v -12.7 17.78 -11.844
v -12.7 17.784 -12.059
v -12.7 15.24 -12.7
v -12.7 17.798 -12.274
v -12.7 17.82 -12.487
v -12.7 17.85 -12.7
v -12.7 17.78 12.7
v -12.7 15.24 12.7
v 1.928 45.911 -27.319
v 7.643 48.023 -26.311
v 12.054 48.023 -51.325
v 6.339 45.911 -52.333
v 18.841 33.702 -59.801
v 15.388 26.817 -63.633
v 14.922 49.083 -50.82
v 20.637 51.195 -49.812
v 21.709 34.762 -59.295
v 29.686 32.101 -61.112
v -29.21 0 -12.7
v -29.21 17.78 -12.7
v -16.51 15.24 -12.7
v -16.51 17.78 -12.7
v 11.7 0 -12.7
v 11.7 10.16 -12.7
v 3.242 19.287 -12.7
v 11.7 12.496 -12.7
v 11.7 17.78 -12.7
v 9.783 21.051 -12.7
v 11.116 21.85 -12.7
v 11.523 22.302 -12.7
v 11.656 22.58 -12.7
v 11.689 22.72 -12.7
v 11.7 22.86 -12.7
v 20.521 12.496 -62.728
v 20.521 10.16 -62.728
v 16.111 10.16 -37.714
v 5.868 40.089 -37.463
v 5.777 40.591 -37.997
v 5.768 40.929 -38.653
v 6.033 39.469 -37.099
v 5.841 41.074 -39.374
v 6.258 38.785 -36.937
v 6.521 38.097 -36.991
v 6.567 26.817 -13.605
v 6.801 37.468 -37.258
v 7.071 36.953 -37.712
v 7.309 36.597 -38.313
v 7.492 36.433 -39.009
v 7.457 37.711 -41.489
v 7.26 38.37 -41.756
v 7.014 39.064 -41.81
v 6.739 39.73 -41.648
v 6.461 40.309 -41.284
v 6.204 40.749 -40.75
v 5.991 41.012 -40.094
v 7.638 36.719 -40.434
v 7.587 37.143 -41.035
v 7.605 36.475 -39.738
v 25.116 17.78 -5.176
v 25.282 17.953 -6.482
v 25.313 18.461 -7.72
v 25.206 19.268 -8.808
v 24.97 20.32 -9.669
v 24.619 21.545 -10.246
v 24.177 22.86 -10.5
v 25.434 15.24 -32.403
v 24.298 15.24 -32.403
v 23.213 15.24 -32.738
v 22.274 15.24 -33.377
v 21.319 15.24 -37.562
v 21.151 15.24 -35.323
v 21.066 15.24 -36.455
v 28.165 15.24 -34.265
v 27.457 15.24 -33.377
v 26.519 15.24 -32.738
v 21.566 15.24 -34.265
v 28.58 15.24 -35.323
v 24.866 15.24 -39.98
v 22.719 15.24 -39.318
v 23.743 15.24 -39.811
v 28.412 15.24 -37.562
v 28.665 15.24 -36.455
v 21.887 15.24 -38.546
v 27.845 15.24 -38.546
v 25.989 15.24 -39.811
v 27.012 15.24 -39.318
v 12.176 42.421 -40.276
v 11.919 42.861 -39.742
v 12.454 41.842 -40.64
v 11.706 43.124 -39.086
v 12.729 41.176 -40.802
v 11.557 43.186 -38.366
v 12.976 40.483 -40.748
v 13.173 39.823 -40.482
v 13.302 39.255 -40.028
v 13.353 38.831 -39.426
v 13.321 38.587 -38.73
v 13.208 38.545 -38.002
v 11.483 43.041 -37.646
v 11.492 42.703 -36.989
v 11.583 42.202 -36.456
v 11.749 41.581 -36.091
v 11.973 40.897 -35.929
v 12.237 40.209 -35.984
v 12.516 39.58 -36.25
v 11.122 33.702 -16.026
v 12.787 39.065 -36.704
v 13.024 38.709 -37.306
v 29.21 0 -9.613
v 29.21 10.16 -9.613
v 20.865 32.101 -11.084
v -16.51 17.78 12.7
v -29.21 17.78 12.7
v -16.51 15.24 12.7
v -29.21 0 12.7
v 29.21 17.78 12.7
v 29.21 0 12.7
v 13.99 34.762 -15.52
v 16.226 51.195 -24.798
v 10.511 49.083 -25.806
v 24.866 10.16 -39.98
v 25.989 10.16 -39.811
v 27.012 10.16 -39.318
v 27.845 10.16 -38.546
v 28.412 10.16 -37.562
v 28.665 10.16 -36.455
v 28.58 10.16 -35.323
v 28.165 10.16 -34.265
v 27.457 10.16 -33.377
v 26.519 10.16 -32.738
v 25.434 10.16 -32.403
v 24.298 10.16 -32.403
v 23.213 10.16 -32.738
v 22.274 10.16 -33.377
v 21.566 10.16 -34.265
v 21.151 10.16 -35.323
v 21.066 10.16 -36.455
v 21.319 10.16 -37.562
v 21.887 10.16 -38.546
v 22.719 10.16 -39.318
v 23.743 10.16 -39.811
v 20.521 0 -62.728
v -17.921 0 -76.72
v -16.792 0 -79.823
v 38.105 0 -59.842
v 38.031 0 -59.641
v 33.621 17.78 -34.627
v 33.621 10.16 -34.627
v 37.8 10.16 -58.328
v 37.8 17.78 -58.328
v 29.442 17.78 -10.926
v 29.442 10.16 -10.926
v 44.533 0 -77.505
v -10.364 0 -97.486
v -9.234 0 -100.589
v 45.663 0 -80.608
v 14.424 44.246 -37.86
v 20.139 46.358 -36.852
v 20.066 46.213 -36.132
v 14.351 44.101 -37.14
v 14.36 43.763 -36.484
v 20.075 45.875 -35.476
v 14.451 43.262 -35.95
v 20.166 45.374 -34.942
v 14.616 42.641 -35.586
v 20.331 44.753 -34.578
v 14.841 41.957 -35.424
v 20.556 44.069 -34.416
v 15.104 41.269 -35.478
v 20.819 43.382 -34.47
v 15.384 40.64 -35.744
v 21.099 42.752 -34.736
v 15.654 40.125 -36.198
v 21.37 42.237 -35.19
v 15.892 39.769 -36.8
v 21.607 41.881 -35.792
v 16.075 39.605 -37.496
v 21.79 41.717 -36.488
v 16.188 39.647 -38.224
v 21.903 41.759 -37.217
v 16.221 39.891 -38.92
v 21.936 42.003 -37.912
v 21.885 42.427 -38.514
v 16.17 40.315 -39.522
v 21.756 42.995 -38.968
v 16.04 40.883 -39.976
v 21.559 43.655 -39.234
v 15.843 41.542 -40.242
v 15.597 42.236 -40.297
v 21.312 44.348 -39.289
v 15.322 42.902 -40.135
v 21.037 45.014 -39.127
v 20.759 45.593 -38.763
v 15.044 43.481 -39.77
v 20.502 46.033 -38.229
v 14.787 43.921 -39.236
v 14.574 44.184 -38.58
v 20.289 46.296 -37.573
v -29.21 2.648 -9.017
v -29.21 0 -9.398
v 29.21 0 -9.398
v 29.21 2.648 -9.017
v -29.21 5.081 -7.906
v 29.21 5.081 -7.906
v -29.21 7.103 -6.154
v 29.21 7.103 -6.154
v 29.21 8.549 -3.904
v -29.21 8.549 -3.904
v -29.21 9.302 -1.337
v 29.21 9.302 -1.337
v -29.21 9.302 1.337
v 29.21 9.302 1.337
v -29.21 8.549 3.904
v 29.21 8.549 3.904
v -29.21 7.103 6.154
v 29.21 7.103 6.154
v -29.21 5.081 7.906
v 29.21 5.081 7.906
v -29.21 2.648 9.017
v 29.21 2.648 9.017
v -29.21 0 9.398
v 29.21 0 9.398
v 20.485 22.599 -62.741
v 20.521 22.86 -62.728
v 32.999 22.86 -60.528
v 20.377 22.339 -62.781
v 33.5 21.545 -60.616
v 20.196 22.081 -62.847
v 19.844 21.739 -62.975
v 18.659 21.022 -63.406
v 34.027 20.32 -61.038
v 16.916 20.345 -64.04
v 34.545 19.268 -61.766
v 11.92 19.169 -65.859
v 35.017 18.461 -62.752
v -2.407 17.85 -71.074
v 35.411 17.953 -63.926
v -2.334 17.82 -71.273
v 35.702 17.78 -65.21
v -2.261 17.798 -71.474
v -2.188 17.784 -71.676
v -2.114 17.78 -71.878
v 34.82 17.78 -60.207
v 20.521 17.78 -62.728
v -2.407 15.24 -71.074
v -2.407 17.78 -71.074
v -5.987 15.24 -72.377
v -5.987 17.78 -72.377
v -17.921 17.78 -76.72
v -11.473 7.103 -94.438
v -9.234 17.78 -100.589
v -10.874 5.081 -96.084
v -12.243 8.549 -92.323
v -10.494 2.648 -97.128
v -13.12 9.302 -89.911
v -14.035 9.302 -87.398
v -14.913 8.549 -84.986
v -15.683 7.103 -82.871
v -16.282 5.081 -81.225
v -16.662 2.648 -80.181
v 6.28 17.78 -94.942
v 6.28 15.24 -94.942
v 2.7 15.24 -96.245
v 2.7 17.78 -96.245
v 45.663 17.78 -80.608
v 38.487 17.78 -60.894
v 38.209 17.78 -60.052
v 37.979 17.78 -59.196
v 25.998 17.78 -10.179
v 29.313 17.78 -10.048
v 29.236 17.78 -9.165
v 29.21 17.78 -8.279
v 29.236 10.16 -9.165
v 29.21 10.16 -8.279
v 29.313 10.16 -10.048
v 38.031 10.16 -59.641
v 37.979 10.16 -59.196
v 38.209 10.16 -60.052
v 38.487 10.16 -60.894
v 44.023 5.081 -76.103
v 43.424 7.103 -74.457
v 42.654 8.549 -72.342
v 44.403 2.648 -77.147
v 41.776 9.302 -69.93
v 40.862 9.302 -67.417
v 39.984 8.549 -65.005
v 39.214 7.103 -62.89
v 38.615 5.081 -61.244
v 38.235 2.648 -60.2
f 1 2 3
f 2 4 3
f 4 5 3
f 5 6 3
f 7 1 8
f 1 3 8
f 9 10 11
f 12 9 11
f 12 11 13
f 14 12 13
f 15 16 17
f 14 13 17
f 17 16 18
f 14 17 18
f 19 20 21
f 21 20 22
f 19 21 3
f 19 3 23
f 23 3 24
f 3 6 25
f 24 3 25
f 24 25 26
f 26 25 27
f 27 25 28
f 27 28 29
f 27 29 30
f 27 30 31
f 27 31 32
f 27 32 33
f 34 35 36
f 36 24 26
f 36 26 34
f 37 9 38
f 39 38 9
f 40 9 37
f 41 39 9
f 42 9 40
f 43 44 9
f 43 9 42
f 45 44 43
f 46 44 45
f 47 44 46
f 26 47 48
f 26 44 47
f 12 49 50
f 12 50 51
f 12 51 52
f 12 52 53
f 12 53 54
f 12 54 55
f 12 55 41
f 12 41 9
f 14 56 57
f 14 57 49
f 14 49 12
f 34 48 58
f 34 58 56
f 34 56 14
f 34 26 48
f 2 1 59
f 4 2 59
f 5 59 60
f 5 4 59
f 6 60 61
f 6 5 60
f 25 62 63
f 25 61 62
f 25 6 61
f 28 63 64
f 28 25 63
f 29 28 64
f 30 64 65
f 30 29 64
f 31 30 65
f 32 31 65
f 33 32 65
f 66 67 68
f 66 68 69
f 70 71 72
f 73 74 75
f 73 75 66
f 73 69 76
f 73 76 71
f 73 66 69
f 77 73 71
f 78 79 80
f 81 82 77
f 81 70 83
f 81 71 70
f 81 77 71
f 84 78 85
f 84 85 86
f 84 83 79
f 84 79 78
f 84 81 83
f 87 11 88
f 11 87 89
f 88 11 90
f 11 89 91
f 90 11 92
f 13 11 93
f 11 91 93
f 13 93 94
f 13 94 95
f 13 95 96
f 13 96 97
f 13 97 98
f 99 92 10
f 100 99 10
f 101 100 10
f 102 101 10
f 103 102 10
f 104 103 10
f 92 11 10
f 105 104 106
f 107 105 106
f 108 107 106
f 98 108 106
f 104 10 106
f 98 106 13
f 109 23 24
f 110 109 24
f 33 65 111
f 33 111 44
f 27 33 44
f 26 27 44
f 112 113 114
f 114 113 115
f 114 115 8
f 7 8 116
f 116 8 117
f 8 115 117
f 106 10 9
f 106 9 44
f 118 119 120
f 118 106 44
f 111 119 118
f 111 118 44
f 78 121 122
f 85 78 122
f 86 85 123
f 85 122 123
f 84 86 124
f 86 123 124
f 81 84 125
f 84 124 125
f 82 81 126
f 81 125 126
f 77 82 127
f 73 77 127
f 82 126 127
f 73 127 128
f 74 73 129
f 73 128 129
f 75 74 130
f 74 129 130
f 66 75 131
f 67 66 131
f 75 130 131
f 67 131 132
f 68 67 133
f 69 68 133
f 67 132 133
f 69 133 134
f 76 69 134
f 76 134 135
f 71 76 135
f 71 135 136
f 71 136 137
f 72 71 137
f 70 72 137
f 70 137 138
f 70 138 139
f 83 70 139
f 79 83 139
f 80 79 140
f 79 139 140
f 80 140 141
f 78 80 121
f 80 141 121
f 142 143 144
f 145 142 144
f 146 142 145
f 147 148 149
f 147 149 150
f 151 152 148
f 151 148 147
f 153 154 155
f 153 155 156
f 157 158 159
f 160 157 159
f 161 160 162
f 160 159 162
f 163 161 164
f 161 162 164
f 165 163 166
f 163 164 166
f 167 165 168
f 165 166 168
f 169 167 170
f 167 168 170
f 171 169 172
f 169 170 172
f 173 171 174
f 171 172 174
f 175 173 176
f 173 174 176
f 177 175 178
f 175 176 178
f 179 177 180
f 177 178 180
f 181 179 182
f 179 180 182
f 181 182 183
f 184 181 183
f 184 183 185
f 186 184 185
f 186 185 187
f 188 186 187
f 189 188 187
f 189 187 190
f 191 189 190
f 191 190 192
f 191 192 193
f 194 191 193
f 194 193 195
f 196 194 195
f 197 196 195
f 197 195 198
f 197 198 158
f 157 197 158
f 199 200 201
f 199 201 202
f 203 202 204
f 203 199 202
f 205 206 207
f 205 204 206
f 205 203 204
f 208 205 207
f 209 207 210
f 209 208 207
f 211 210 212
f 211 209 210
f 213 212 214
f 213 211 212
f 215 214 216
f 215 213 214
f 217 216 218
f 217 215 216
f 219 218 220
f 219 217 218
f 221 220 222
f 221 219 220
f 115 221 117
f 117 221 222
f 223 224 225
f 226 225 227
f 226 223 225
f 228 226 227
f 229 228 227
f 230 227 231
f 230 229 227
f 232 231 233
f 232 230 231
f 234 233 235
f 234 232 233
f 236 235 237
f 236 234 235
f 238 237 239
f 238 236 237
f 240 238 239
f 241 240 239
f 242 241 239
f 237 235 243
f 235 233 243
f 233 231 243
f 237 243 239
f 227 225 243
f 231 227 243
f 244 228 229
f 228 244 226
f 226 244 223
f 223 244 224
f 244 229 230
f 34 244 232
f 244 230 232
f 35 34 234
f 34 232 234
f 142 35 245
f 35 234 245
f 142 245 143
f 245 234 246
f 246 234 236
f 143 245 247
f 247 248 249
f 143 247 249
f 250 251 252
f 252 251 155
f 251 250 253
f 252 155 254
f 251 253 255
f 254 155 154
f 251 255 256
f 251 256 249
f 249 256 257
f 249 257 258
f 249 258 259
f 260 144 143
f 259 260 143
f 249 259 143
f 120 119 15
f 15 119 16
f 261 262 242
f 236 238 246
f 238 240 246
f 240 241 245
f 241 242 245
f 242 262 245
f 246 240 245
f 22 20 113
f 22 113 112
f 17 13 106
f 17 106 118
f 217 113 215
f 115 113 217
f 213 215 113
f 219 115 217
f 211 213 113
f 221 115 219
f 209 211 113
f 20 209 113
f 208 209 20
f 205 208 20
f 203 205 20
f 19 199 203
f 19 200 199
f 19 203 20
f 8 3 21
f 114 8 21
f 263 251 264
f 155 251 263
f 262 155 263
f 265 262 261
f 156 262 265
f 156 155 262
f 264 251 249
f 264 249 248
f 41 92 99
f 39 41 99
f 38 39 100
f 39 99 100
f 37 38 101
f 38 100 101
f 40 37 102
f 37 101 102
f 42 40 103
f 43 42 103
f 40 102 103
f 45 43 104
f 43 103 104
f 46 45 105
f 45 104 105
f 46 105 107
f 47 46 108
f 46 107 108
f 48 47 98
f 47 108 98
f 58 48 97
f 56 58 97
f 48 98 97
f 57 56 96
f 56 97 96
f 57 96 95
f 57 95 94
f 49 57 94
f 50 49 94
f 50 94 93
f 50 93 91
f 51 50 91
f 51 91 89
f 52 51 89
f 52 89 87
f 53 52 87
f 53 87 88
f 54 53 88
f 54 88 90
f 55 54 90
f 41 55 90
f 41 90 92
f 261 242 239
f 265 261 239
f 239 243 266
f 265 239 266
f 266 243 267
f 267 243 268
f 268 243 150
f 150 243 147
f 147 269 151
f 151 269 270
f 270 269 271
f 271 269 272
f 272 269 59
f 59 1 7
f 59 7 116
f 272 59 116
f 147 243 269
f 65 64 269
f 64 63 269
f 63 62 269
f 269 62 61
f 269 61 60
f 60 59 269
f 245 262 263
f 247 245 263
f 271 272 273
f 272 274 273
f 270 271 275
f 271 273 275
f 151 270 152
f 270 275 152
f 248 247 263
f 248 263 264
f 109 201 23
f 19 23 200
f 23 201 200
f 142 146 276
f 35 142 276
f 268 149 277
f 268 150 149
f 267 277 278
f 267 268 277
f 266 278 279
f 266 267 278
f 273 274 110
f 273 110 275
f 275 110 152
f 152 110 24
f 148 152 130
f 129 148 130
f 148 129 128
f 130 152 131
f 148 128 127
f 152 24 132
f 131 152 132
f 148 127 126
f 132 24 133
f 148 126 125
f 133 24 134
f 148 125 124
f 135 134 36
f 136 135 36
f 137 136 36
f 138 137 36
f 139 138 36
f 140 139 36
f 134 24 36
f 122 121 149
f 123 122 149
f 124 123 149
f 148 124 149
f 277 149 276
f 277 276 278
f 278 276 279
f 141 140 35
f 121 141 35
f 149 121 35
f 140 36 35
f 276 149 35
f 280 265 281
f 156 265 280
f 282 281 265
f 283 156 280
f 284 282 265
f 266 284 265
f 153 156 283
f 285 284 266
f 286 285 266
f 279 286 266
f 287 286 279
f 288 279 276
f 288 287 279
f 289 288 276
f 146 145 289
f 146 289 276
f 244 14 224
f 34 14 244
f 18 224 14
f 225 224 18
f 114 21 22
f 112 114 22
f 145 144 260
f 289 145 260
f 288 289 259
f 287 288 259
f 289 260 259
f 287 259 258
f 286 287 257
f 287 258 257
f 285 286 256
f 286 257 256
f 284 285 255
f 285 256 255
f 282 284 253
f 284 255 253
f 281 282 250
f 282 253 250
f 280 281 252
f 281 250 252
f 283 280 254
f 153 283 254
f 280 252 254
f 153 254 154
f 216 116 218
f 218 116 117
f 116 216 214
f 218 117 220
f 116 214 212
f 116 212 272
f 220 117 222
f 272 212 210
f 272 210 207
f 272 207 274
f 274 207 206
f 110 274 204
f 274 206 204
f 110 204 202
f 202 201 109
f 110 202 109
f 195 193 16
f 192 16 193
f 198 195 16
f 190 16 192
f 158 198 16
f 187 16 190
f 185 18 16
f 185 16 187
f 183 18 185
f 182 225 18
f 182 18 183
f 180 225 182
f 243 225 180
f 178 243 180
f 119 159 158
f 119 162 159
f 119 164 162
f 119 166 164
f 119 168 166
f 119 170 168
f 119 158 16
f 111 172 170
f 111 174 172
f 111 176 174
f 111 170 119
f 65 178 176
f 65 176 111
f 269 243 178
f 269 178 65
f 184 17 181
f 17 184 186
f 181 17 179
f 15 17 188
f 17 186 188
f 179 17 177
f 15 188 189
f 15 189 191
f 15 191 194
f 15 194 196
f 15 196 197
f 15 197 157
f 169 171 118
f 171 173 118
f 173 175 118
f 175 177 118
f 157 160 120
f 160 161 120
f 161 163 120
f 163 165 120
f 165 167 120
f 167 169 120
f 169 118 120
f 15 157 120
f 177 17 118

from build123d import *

# Parameters (mm, degrees)
SKETCH2_W           = 58.42
SKETCH2_H           = 25.4
BOSS_EXTRUDE1_DEPTH = 17.78
CUT_EXTRUDE2_DEPTH  = 63.372388122
SKETCH6_W           = 3.81
SKETCH6_H           = 2.54
CUT_EXTRUDE3_DEPTH  = 25.4
CUT_EXTRUDE4_DEPTH  = 25.4
SKETCH8_W           = 17.78
SKETCH8_H           = 17.78
BOSS_EXTRUDE2_DEPTH = 25.4
SKETCH13_W          = 58.42
SKETCH13_H          = 9.398
CUT_EXTRUDE6_REACH  = 59.763
SKETCH15_W          = 25.4
SKETCH15_H          = 10.16
MIRROR14_START      = 9.31703521
MIRROR14_OUTLINE_W  = 7.62
MIRROR14_OUTLINE_H  = 25.4
MIRROR14_DEPTH      = 17.78
CUT_EXTRUDE7_DEPTH  = 25.4
BOSS_EXTRUDE3_DEPTH = 35.56
CUT_EXTRUDE8_REACH  = 128.018
CUT_EXTRUDE9_REACH  = 111.199
CUT_EXTRUDE10_REACH = 128.018
SKETCH25_R          = 2.4765
SKETCH26_R          = 3.81
CUT_EXTRUDE11_DEPTH = 5.08
FILLET1_R           = 15.24
FILLET2_R           = 5.08


with BuildPart() as part:
    # Sketch2 → Boss-Extrude1 (new body)
    with BuildSketch(Plane(origin=(0, 0, 0), x_dir=(1, 0, 0), z_dir=(0, 1, 0))):
        Rectangle(SKETCH2_W, SKETCH2_H)
    boss_extrude1 = extrude(amount=BOSS_EXTRUDE1_DEPTH)

    # Sketch4 → Cut-Extrude2 (cut, symmetric)
    with BuildSketch(Plane.ZY.offset(29.21)):
        with BuildLine():
            Line((-9.398, -66.725655712), (-9.398, 0))
            ThreePointArc((-9.398, 0), (0, 9.398), (9.398, 0))
            Line((9.398, 0), (9.398, -66.725655712))
            Line((9.398, -66.725655712), (9.398, -200.176967137))
            Line((9.398, -200.176967137), (-9.398, -200.176967137))
            Line((-9.398, -200.176967137), (-9.398, -66.725655712))
        make_face()
    cut_extrude2 = extrude(amount=CUT_EXTRUDE2_DEPTH, both=True, mode=Mode.SUBTRACT)

    # Sketch6 → Cut-Extrude3 (cut)
    with BuildSketch(Plane(origin=(0, 0, -12.7), x_dir=(-1, 0, 0), z_dir=(0, 0, -1))):
        with Locations((14.605, 16.51)):
            Rectangle(SKETCH6_W, SKETCH6_H)
    cut_extrude3 = extrude(amount=-CUT_EXTRUDE3_DEPTH, mode=Mode.SUBTRACT)

    # Sketch7 → Cut-Extrude4 (cut)
    with BuildSketch(Plane(origin=(0, 17.78, 0), x_dir=(1, 0, 0), z_dir=(0, 1, 0))):
        Polygon((11.700118151, 12.7), (29.21, 9.612535401), (29.21, 12.7), align=None)
    extrude(amount=-CUT_EXTRUDE4_DEPTH, mode=Mode.SUBTRACT)

    # Sketch8 → Boss-Extrude2 (add)
    with BuildSketch(Plane(origin=(2.524629641, 0, -14.317886186), x_dir=(-0.9848077530122094, 0, -0.17364817766692317), z_dir=(0.17364817766692317, 0, -0.9848077530122094))):
        with Locations((-18.20703521, 8.89)):
            Rectangle(SKETCH8_W, SKETCH8_H)
    extrude(amount=BOSS_EXTRUDE2_DEPTH)

    # Sketch13 → Cut-Revolve2 (revolve, cut)
    with BuildSketch(Plane.XZ):
        with Locations((0, 4.699)):
            Rectangle(SKETCH13_W, SKETCH13_H)
    revolve(axis=Axis((28.421300087, 0, 0), (-1, 0, 0)), mode=Mode.SUBTRACT)

    # Sketch15 → Cut-Extrude6 (cut, up to next)
    with BuildSketch(Plane(origin=(9.17548851, 0, 1.617886186), x_dir=(-0.17364817766692317, 0, 0.9848077530122095), z_dir=(-0.9848077530122095, 0, -0.17364817766692317)), mode=Mode.PRIVATE) as cut_extrude6_sk1:
        with Locations((-27.238762659, 5.08)):
            Rectangle(SKETCH15_W, SKETCH15_H)
    cut_extrude6_tool1 = extrude(cut_extrude6_sk1.sketch, amount=-CUT_EXTRUDE6_REACH, mode=Mode.PRIVATE) & part.part
    cut_extrude6 = cut_extrude6_tool1.solids().sort_by_distance((13.90545, 5.08, -25.207058))[0]
    add(cut_extrude6, mode=Mode.SUBTRACT)

    # Mirror14: read off the stored shape, not the designer's step
    # Mirror14 outline → Mirror14 (add)
    with BuildSketch(Plane(origin=(0, 0, 0), x_dir=(0, 1, 0), z_dir=(0.9848077530122094, 0, 0.17364817766692306)).offset(MIRROR14_START)):
        with Locations((13.97, -52.638762659)):
            Rectangle(MIRROR14_OUTLINE_W, MIRROR14_OUTLINE_H)
    extrude(amount=MIRROR14_DEPTH)

    # Mirror15: Boss-Extrude1 across plane
    add(boss_extrude1.mirror(Plane(origin=(6.935293354, 0, -39.332003112), x_dir=(0.9848077530122092, 0, 0.17364817766692314), z_dir=(0.17364817766692314, 0, -0.9848077530122094))))

    # Mirror16: Cut-Extrude2, Cut-Extrude3, Cut-Extrude6 across plane
    add(cut_extrude2.mirror(Plane(origin=(6.935293354, 0, -39.332003112), x_dir=(0.9848077530122092, 0, 0.17364817766692314), z_dir=(0.17364817766692314, 0, -0.9848077530122094))), mode=Mode.SUBTRACT)
    add(cut_extrude3.mirror(Plane(origin=(6.935293354, 0, -39.332003112), x_dir=(0.9848077530122092, 0, 0.17364817766692314), z_dir=(0.17364817766692314, 0, -0.9848077530122094))), mode=Mode.SUBTRACT)
    add(cut_extrude6.mirror(Plane(origin=(6.935293354, 0, -39.332003112), x_dir=(0.9848077530122092, 0, 0.17364817766692314), z_dir=(0.17364817766692314, 0, -0.9848077530122094))), mode=Mode.SUBTRACT)

    # Sketch21 → Cut-Extrude7 (cut, symmetric)
    with BuildSketch(Plane(origin=(6.935293354, 0, -39.332003112), x_dir=(-0.9848077530122094, 0, -0.17364817766692314), z_dir=(0.17364817766692314, 0, -0.9848077530122094))):
        Polygon((-23.83567521, 17.78), (-9.31703521, 12.495647198), (-9.31703521, 17.78), align=None)
    extrude(amount=CUT_EXTRUDE7_DEPTH, both=True, mode=Mode.SUBTRACT)

    # Sketch22 → Boss-Extrude3 (add)
    with BuildSketch(Plane(origin=(-2.881682913, 8.039496752, -0.508118447), x_dir=(-0.19346054761682988, -0.00733712504048707, 0.9810806200878379), z_dir=(-0.33682408883345943, 0.9396926207859106, -0.059391174613881166))):
        Polygon((-65.934673992, 27.071104434), (-15.146364467, 28.160882213), (-14.814917266, 12.714023803), (-65.603226791, 11.624246024), align=None)
    extrude(amount=BOSS_EXTRUDE3_DEPTH)

    # Sketch23 → Cut-Extrude8 (cut, up to next)
    with BuildSketch(Plane(origin=(26.355240658, 9.740503248, 4.647140011), x_dir=(0.3782029195796047, -0.8606292095735792, -0.3409984094540904), z_dir=(0.9254165783983268, 0.3420201433256624, 0.16317591116652866)), mode=Mode.PRIVATE) as cut_extrude8_sk1:
        Polygon((-19.269639975, 65.921874736), (4.43963551, 69.395008187), (-14.170689985, 77.55332817), align=None)
    cut_extrude8_tool1 = extrude(cut_extrude8_sk1.sketch, amount=-CUT_EXTRUDE8_REACH, mode=Mode.PRIVATE) & part.part
    # Sketch23 → Cut-Extrude8 (cut, up to next)
    with BuildSketch(Plane(origin=(26.355240658, 9.740503248, 4.647140011), x_dir=(0.3782029195796047, -0.8606292095735792, -0.3409984094540904), z_dir=(0.9254165783983268, 0.3420201433256624, 0.16317591116652866)), mode=Mode.PRIVATE) as cut_extrude8_sk2:
        Polygon((-15.956164448, 22.869194448), (-34.566489944, 31.027514432), (-29.467539954, 42.658967866), align=None)
    cut_extrude8_tool2 = extrude(cut_extrude8_sk2.sketch, amount=-CUT_EXTRUDE8_REACH, mode=Mode.PRIVATE) & part.part
    add(cut_extrude8_tool1.solids().sort_by_distance((24.388361, 44.830618, -57.747753))[0], mode=Mode.SUBTRACT)
    add(cut_extrude8_tool2.solids().sort_by_distance((17.037255, 44.830618, -16.057558))[0], mode=Mode.SUBTRACT)

    # Cut-Extrude9: up to this plane
    cut_extrude9_end = Plane(origin=(-45.924606639, 26.595398182, -61.548547649), z_dir=(0.031263049894144905, -0.49803609294534235, 0.8665925639163162))
    # Sketch24 → Cut-Extrude9 (cut, up to the surface)
    with BuildSketch(Plane(origin=(2.524629641, 0, -14.317886186), x_dir=(-0.9848077530122095, 0, -0.1736481776669232), z_dir=(0.1736481776669232, 0, -0.9848077530122095)), mode=Mode.PRIVATE) as cut_extrude9_sk1:
        Polygon((-8.170546151, 33.702451643), (-11.082465645, 34.762303663), (-5.87007866, 49.083219204), (-2.958159167, 48.023367184), align=None)
    cut_extrude9_tool1 = split(extrude(cut_extrude9_sk1.sketch, amount=CUT_EXTRUDE9_REACH, mode=Mode.PRIVATE), bisect_by=cut_extrude9_end, keep=Keep.BOTH, mode=Mode.PRIVATE)
    add(cut_extrude9_tool1.solids().sort_by_distance((9.438288, 41.392835, -13.098822))[0], mode=Mode.SUBTRACT)

    # Cut-Extrude10: up to this face of the body (flat: up to its plane)
    cut_extrude10_end = Plane(part.part.faces().sort_by_distance((10.739934643, 27.479568088, -38.661142201))[0])
    # Sketch25 → Cut-Extrude10 (cut, up to the picked face)
    with BuildSketch(Plane(origin=(26.355240658, 9.740503248, 4.647140011), x_dir=(0.3782029195796047, -0.8606292095735792, -0.3409984094540904), z_dir=(0.9254165783983268, 0.3420201433256624, 0.16317591116652866)), mode=Mode.PRIVATE) as cut_extrude10_sk1:
        with Locations(Location((-17.389717904, 51.231051307, 0), (0, 0, 159.779686777))):
            Circle(SKETCH25_R)
    cut_extrude10_tool1 = split(extrude(cut_extrude10_sk1.sketch, amount=-CUT_EXTRUDE10_REACH, mode=Mode.PRIVATE), bisect_by=cut_extrude10_end, keep=Keep.BOTH, mode=Mode.PRIVATE)
    add(cut_extrude10_tool1.solids().sort_by(Axis((20.997986, 44.035012, -36.852371), (-0.9254165783983268, -0.3420201433256624, -0.16317591116652866)))[0], mode=Mode.SUBTRACT)

    # Sketch26 → Cut-Extrude11 (cut)
    with BuildSketch(Plane.XZ.offset(-10.16)):
        with Locations(Location((24.865722788, -36.170384627, 0), (0, 0, 270))):
            Circle(SKETCH26_R)
    extrude(amount=-CUT_EXTRUDE11_DEPTH, mode=Mode.SUBTRACT)

    # Fillet1
    fillet1_edges = [part.edges().sort_by_distance(p)[0] for p in [
        (29.21, 13.97, -9.612535401),
        (38.031327425, 13.97, -59.640769254),
    ]]
    fillet(fillet1_edges, radius=FILLET1_R)

    # Fillet2
    # the kernel refuses this fillet: 5.08 mm, written as the material it adds along each edge
    with BuildSketch(Plane(origin=(-16.999729813, 17.78, -69.344229422), x_dir=(0.17364817766692311, 0, -0.9848077530122094), z_dir=(0.9848077530122094, 0, 0.17364817766692314))) as fillet2_piece_1_section:
        with BuildLine():
            CenterArc((FILLET2_R, FILLET2_R), FILLET2_R, 180, 90)
            Line((0, FILLET2_R), (0, 0))
            Line((0, 0), (FILLET2_R, 0))
        make_face()
    fillet2_piece_1 = extrude(amount=65.31864, mode=Mode.PRIVATE)
    fillet2_piece_1 = split(fillet2_piece_1, bisect_by=Plane(origin=(28.757814695, 34.691304915, -61.275939754), z_dir=(-0.925416578398327, -0.34202014332566266, -0.16317591116652855)), keep=Keep.TOP, mode=Mode.PRIVATE)
    fillet2_piece_1 = split(fillet2_piece_1, bisect_by=Plane(origin=(-4.669969149, 17.78, -64.856563545), z_dir=(0.9396926207859135, 0, 0.342020143325655)), keep=Keep.TOP, mode=Mode.PRIVATE)
    fillet2_piece_1 = split(fillet2_piece_1, bisect_by=Plane(origin=(-14.73692606, 17.78, -75.561231638), z_dir=(0.342020143325655, 0, -0.9396926207859134)), keep=Keep.TOP, mode=Mode.PRIVATE)
    add(fillet2_piece_1)
    with BuildSketch(Plane(origin=(-25.821057238, 17.78, -19.315995569), x_dir=(-0.17364817766692314, 0, 0.9848077530122094), z_dir=(0.9848077530122094, 0, 0.17364817766692314))) as fillet2_piece_2_section:
        with BuildLine():
            CenterArc((FILLET2_R, -FILLET2_R), FILLET2_R, 90, 90)
            Line((0, -FILLET2_R), (0, 0))
            Line((0, 0), (FILLET2_R, 0))
        make_face()
    fillet2_piece_2 = extrude(amount=65.31864, mode=Mode.PRIVATE)
    fillet2_piece_2 = split(fillet2_piece_2, bisect_by=Plane(origin=(-12.7, 17.78, -19.315995569), z_dir=(1, 0, 0)), keep=Keep.TOP, mode=Mode.PRIVATE)
    fillet2_piece_2 = split(fillet2_piece_2, bisect_by=Plane(origin=(-25.821057238, 17.78, -12.7), z_dir=(0, 0, 1)), keep=Keep.TOP, mode=Mode.PRIVATE)
    fillet2_piece_2 = split(fillet2_piece_2, bisect_by=Plane(origin=(19.93648727, 34.691304915, -11.247705901), z_dir=(-0.925416578398327, -0.34202014332566266, -0.16317591116652855)), keep=Keep.TOP, mode=Mode.PRIVATE)
    add(fillet2_piece_2)


solid = part.part
